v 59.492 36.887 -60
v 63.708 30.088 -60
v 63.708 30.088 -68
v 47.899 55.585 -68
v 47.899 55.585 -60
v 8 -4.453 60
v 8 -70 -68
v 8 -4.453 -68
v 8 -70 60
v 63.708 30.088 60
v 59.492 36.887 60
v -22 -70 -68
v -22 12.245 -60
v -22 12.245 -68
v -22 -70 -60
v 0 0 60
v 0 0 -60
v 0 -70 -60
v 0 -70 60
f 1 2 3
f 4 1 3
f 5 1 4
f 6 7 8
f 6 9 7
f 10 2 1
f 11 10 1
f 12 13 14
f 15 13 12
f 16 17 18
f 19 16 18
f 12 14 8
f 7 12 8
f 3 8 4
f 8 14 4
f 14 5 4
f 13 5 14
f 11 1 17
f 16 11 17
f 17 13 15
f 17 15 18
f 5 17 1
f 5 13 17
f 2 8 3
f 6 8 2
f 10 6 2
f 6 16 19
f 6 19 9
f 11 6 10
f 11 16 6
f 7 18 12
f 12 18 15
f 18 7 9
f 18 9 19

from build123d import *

# Parameters (mm, degrees)
BRKT_3_4_BOSS_EXTRUDE1_START = -60
BRKT_3_4_BOSS_EXTRUDE1_DEPTH = 120
BOSS_EXTRUDE1_DEPTH          = 8


# Read off the part's stored shape, not the designer's step: <BRKT_3_4>-<Boss-Extrude1>
with BuildPart() as part:
    # <BRKT_3_4>-<Boss-Extrude1> outline → <BRKT_3_4>-<Boss-Extrude1> (new body)
    with BuildSketch(Plane.XY.offset(BRKT_3_4_BOSS_EXTRUDE1_START)):
        Polygon((0, 0), (0, -70), (8, -70), (8, -4.452742878), (63.708134873, 30.087764141), (59.492488509, 36.886905685), align=None)
    extrude(amount=BRKT_3_4_BOSS_EXTRUDE1_DEPTH)

    # Sketch1 → Boss-Extrude1 (add)
    with BuildSketch(Plane(origin=(0, 0, -60), x_dir=(-1, 0, 0), z_dir=(0, 0, -1))):
        Polygon((-63.708134873, 30.087764141), (-47.899461008, 55.58454493), (22, 12.245042915), (22, -70), (0, -70), (-8, -70), (-8, -4.452742878), align=None)
    extrude(amount=BOSS_EXTRUDE1_DEPTH)


solid = part.part
